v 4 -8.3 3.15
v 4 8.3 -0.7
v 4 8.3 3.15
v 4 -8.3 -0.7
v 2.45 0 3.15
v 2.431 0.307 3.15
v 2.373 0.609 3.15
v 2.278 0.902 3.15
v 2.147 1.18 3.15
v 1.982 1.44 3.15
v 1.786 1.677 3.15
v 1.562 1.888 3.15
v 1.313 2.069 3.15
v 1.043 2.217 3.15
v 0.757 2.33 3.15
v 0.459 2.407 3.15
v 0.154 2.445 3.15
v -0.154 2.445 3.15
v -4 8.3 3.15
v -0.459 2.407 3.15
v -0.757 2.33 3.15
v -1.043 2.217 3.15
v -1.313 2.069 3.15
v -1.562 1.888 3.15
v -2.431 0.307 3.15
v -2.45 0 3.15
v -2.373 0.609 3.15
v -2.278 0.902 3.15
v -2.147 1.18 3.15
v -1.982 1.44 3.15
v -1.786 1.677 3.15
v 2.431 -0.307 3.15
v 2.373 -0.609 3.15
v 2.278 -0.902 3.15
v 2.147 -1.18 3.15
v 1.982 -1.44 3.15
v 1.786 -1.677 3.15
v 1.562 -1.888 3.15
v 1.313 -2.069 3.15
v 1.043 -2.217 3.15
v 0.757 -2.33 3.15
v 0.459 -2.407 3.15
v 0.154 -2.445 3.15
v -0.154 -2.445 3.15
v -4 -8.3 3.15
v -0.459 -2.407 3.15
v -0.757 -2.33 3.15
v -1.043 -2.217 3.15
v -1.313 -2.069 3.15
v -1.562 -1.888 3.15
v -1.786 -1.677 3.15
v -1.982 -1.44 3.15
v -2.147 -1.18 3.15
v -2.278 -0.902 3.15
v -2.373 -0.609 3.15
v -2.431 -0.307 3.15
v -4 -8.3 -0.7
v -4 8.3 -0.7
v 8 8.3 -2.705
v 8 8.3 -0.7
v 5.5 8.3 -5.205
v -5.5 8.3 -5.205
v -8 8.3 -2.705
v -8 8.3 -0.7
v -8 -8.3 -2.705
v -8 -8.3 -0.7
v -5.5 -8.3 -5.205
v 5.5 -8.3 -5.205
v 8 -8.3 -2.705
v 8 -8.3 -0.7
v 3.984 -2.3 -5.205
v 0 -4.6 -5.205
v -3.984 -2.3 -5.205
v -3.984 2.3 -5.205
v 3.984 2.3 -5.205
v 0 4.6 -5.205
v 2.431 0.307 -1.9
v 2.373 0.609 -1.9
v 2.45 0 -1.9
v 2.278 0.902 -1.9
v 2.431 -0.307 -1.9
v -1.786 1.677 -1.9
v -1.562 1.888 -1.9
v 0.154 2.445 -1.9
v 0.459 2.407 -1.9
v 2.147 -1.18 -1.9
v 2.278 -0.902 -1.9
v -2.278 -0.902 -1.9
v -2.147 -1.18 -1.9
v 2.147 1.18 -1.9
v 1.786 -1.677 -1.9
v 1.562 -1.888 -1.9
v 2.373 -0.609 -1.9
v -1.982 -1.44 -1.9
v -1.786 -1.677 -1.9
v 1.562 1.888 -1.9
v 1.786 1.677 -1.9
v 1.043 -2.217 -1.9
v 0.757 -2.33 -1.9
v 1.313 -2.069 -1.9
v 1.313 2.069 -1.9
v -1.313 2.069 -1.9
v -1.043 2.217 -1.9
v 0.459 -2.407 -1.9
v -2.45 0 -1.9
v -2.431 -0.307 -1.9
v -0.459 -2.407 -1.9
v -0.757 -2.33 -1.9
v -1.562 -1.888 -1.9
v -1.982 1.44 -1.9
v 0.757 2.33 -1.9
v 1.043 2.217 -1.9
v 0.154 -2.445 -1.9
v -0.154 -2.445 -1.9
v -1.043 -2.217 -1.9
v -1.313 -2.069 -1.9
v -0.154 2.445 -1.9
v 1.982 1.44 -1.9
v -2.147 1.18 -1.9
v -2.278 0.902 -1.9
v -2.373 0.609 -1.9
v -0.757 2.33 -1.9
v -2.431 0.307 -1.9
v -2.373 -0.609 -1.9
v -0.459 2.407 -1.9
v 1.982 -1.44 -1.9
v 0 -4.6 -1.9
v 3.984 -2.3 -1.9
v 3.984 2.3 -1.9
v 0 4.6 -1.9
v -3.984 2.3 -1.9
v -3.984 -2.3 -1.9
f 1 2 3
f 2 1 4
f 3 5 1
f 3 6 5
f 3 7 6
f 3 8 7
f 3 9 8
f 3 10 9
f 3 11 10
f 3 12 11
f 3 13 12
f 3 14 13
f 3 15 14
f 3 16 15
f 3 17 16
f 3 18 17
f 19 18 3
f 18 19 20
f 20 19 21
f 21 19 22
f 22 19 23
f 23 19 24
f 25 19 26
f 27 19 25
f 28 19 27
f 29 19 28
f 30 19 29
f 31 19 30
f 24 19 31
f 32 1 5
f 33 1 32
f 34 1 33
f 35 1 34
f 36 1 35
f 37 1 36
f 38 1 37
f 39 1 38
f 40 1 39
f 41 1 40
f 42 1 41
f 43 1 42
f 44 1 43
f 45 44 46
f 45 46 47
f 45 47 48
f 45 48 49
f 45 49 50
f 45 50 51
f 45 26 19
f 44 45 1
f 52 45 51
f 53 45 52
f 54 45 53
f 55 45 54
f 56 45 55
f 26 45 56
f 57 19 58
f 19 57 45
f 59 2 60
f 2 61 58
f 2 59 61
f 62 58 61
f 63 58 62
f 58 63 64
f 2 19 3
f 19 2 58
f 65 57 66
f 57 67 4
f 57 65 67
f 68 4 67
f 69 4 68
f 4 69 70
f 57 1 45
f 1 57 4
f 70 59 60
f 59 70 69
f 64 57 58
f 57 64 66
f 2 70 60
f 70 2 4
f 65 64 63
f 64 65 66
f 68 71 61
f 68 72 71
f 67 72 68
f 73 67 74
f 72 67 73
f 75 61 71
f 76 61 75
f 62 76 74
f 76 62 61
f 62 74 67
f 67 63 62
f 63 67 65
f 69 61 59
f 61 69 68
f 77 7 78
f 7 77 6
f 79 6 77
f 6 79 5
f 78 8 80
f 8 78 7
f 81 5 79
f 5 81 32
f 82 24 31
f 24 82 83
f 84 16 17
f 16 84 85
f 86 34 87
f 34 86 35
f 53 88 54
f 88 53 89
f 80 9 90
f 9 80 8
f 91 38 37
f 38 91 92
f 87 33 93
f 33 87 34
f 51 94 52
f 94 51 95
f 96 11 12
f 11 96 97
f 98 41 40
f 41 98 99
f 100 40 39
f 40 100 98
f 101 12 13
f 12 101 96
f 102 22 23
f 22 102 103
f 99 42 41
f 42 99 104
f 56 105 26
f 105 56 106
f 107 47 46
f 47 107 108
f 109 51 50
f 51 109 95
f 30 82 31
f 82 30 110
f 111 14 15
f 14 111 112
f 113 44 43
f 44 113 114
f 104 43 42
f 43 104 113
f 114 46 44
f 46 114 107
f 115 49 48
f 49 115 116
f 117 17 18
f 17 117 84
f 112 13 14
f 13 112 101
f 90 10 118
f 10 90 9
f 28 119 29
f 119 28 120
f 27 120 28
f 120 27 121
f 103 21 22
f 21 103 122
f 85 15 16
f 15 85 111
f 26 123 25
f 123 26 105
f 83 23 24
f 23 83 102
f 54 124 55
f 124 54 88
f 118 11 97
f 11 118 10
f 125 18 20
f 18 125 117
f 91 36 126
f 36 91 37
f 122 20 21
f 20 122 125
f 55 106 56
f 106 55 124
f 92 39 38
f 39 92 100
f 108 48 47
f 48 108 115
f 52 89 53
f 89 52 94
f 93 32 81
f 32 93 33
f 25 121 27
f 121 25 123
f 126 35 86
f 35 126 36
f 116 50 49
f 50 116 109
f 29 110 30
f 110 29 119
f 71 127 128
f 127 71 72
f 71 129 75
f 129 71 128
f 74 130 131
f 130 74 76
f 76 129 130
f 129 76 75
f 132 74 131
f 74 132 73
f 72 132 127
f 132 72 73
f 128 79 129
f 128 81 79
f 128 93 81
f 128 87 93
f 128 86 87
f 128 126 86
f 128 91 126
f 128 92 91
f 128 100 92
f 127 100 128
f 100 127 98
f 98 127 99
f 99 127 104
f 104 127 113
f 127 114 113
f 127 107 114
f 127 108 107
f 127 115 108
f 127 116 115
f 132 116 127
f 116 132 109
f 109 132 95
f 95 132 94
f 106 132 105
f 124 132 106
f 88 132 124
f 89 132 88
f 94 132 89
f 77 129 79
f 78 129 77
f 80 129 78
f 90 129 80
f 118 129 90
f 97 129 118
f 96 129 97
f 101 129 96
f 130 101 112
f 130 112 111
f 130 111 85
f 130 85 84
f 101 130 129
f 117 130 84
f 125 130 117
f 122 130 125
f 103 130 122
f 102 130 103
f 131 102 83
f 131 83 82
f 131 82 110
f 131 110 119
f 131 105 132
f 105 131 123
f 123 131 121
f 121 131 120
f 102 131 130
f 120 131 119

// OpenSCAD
/*CNC3018 Nutenschuh
20180727 P. de Graaff
*/
//M5 - 5, M6 - 6
Mx=5;             
difference(){
    corpus();                                                                   //Nutenschuh
    if (Mx==5){
        translate([0,0,-20])cylinder(d=4.9,h=50,$fn=50);                        //Bohrung fuer M5-Schraube
        translate([0,0,-5.3])rotate([0,0,30])cylinder(d=9.2,h=3.4,$fn=6);       //Sechskant Loch fuer M5-Mutter
        
    }
    else{
        translate([0,0,-20])cylinder(d=5.6,h=50,$fn=50);                       //Bohrung fuer M&-Schraube
        translate([0,0,-5.6])rotate([0,0,30])cylinder(d=11.8,h=5,$fn=6);       //Sechskant Loch fuer M6-Mutter        
    }
        
}
//T-Nutenschuh 16.6mm lang, ohne Bohrung
module corpus(){
    //obere Fuehrung
    translate([0,0,(4-1.7)/2])cube([8,16.6,4],center=true);
    //Klemmflaeche
    translate([0,0,-1.7])cube([16,16.6,2],center=true);
    //Profil unten
    translate([0,0,-2.7])hull(){
        cube([16,16.6,0.01],center=true);
        translate([0,0,-2.5])cube([11,16.6,0.01],center=true);
    }
}
